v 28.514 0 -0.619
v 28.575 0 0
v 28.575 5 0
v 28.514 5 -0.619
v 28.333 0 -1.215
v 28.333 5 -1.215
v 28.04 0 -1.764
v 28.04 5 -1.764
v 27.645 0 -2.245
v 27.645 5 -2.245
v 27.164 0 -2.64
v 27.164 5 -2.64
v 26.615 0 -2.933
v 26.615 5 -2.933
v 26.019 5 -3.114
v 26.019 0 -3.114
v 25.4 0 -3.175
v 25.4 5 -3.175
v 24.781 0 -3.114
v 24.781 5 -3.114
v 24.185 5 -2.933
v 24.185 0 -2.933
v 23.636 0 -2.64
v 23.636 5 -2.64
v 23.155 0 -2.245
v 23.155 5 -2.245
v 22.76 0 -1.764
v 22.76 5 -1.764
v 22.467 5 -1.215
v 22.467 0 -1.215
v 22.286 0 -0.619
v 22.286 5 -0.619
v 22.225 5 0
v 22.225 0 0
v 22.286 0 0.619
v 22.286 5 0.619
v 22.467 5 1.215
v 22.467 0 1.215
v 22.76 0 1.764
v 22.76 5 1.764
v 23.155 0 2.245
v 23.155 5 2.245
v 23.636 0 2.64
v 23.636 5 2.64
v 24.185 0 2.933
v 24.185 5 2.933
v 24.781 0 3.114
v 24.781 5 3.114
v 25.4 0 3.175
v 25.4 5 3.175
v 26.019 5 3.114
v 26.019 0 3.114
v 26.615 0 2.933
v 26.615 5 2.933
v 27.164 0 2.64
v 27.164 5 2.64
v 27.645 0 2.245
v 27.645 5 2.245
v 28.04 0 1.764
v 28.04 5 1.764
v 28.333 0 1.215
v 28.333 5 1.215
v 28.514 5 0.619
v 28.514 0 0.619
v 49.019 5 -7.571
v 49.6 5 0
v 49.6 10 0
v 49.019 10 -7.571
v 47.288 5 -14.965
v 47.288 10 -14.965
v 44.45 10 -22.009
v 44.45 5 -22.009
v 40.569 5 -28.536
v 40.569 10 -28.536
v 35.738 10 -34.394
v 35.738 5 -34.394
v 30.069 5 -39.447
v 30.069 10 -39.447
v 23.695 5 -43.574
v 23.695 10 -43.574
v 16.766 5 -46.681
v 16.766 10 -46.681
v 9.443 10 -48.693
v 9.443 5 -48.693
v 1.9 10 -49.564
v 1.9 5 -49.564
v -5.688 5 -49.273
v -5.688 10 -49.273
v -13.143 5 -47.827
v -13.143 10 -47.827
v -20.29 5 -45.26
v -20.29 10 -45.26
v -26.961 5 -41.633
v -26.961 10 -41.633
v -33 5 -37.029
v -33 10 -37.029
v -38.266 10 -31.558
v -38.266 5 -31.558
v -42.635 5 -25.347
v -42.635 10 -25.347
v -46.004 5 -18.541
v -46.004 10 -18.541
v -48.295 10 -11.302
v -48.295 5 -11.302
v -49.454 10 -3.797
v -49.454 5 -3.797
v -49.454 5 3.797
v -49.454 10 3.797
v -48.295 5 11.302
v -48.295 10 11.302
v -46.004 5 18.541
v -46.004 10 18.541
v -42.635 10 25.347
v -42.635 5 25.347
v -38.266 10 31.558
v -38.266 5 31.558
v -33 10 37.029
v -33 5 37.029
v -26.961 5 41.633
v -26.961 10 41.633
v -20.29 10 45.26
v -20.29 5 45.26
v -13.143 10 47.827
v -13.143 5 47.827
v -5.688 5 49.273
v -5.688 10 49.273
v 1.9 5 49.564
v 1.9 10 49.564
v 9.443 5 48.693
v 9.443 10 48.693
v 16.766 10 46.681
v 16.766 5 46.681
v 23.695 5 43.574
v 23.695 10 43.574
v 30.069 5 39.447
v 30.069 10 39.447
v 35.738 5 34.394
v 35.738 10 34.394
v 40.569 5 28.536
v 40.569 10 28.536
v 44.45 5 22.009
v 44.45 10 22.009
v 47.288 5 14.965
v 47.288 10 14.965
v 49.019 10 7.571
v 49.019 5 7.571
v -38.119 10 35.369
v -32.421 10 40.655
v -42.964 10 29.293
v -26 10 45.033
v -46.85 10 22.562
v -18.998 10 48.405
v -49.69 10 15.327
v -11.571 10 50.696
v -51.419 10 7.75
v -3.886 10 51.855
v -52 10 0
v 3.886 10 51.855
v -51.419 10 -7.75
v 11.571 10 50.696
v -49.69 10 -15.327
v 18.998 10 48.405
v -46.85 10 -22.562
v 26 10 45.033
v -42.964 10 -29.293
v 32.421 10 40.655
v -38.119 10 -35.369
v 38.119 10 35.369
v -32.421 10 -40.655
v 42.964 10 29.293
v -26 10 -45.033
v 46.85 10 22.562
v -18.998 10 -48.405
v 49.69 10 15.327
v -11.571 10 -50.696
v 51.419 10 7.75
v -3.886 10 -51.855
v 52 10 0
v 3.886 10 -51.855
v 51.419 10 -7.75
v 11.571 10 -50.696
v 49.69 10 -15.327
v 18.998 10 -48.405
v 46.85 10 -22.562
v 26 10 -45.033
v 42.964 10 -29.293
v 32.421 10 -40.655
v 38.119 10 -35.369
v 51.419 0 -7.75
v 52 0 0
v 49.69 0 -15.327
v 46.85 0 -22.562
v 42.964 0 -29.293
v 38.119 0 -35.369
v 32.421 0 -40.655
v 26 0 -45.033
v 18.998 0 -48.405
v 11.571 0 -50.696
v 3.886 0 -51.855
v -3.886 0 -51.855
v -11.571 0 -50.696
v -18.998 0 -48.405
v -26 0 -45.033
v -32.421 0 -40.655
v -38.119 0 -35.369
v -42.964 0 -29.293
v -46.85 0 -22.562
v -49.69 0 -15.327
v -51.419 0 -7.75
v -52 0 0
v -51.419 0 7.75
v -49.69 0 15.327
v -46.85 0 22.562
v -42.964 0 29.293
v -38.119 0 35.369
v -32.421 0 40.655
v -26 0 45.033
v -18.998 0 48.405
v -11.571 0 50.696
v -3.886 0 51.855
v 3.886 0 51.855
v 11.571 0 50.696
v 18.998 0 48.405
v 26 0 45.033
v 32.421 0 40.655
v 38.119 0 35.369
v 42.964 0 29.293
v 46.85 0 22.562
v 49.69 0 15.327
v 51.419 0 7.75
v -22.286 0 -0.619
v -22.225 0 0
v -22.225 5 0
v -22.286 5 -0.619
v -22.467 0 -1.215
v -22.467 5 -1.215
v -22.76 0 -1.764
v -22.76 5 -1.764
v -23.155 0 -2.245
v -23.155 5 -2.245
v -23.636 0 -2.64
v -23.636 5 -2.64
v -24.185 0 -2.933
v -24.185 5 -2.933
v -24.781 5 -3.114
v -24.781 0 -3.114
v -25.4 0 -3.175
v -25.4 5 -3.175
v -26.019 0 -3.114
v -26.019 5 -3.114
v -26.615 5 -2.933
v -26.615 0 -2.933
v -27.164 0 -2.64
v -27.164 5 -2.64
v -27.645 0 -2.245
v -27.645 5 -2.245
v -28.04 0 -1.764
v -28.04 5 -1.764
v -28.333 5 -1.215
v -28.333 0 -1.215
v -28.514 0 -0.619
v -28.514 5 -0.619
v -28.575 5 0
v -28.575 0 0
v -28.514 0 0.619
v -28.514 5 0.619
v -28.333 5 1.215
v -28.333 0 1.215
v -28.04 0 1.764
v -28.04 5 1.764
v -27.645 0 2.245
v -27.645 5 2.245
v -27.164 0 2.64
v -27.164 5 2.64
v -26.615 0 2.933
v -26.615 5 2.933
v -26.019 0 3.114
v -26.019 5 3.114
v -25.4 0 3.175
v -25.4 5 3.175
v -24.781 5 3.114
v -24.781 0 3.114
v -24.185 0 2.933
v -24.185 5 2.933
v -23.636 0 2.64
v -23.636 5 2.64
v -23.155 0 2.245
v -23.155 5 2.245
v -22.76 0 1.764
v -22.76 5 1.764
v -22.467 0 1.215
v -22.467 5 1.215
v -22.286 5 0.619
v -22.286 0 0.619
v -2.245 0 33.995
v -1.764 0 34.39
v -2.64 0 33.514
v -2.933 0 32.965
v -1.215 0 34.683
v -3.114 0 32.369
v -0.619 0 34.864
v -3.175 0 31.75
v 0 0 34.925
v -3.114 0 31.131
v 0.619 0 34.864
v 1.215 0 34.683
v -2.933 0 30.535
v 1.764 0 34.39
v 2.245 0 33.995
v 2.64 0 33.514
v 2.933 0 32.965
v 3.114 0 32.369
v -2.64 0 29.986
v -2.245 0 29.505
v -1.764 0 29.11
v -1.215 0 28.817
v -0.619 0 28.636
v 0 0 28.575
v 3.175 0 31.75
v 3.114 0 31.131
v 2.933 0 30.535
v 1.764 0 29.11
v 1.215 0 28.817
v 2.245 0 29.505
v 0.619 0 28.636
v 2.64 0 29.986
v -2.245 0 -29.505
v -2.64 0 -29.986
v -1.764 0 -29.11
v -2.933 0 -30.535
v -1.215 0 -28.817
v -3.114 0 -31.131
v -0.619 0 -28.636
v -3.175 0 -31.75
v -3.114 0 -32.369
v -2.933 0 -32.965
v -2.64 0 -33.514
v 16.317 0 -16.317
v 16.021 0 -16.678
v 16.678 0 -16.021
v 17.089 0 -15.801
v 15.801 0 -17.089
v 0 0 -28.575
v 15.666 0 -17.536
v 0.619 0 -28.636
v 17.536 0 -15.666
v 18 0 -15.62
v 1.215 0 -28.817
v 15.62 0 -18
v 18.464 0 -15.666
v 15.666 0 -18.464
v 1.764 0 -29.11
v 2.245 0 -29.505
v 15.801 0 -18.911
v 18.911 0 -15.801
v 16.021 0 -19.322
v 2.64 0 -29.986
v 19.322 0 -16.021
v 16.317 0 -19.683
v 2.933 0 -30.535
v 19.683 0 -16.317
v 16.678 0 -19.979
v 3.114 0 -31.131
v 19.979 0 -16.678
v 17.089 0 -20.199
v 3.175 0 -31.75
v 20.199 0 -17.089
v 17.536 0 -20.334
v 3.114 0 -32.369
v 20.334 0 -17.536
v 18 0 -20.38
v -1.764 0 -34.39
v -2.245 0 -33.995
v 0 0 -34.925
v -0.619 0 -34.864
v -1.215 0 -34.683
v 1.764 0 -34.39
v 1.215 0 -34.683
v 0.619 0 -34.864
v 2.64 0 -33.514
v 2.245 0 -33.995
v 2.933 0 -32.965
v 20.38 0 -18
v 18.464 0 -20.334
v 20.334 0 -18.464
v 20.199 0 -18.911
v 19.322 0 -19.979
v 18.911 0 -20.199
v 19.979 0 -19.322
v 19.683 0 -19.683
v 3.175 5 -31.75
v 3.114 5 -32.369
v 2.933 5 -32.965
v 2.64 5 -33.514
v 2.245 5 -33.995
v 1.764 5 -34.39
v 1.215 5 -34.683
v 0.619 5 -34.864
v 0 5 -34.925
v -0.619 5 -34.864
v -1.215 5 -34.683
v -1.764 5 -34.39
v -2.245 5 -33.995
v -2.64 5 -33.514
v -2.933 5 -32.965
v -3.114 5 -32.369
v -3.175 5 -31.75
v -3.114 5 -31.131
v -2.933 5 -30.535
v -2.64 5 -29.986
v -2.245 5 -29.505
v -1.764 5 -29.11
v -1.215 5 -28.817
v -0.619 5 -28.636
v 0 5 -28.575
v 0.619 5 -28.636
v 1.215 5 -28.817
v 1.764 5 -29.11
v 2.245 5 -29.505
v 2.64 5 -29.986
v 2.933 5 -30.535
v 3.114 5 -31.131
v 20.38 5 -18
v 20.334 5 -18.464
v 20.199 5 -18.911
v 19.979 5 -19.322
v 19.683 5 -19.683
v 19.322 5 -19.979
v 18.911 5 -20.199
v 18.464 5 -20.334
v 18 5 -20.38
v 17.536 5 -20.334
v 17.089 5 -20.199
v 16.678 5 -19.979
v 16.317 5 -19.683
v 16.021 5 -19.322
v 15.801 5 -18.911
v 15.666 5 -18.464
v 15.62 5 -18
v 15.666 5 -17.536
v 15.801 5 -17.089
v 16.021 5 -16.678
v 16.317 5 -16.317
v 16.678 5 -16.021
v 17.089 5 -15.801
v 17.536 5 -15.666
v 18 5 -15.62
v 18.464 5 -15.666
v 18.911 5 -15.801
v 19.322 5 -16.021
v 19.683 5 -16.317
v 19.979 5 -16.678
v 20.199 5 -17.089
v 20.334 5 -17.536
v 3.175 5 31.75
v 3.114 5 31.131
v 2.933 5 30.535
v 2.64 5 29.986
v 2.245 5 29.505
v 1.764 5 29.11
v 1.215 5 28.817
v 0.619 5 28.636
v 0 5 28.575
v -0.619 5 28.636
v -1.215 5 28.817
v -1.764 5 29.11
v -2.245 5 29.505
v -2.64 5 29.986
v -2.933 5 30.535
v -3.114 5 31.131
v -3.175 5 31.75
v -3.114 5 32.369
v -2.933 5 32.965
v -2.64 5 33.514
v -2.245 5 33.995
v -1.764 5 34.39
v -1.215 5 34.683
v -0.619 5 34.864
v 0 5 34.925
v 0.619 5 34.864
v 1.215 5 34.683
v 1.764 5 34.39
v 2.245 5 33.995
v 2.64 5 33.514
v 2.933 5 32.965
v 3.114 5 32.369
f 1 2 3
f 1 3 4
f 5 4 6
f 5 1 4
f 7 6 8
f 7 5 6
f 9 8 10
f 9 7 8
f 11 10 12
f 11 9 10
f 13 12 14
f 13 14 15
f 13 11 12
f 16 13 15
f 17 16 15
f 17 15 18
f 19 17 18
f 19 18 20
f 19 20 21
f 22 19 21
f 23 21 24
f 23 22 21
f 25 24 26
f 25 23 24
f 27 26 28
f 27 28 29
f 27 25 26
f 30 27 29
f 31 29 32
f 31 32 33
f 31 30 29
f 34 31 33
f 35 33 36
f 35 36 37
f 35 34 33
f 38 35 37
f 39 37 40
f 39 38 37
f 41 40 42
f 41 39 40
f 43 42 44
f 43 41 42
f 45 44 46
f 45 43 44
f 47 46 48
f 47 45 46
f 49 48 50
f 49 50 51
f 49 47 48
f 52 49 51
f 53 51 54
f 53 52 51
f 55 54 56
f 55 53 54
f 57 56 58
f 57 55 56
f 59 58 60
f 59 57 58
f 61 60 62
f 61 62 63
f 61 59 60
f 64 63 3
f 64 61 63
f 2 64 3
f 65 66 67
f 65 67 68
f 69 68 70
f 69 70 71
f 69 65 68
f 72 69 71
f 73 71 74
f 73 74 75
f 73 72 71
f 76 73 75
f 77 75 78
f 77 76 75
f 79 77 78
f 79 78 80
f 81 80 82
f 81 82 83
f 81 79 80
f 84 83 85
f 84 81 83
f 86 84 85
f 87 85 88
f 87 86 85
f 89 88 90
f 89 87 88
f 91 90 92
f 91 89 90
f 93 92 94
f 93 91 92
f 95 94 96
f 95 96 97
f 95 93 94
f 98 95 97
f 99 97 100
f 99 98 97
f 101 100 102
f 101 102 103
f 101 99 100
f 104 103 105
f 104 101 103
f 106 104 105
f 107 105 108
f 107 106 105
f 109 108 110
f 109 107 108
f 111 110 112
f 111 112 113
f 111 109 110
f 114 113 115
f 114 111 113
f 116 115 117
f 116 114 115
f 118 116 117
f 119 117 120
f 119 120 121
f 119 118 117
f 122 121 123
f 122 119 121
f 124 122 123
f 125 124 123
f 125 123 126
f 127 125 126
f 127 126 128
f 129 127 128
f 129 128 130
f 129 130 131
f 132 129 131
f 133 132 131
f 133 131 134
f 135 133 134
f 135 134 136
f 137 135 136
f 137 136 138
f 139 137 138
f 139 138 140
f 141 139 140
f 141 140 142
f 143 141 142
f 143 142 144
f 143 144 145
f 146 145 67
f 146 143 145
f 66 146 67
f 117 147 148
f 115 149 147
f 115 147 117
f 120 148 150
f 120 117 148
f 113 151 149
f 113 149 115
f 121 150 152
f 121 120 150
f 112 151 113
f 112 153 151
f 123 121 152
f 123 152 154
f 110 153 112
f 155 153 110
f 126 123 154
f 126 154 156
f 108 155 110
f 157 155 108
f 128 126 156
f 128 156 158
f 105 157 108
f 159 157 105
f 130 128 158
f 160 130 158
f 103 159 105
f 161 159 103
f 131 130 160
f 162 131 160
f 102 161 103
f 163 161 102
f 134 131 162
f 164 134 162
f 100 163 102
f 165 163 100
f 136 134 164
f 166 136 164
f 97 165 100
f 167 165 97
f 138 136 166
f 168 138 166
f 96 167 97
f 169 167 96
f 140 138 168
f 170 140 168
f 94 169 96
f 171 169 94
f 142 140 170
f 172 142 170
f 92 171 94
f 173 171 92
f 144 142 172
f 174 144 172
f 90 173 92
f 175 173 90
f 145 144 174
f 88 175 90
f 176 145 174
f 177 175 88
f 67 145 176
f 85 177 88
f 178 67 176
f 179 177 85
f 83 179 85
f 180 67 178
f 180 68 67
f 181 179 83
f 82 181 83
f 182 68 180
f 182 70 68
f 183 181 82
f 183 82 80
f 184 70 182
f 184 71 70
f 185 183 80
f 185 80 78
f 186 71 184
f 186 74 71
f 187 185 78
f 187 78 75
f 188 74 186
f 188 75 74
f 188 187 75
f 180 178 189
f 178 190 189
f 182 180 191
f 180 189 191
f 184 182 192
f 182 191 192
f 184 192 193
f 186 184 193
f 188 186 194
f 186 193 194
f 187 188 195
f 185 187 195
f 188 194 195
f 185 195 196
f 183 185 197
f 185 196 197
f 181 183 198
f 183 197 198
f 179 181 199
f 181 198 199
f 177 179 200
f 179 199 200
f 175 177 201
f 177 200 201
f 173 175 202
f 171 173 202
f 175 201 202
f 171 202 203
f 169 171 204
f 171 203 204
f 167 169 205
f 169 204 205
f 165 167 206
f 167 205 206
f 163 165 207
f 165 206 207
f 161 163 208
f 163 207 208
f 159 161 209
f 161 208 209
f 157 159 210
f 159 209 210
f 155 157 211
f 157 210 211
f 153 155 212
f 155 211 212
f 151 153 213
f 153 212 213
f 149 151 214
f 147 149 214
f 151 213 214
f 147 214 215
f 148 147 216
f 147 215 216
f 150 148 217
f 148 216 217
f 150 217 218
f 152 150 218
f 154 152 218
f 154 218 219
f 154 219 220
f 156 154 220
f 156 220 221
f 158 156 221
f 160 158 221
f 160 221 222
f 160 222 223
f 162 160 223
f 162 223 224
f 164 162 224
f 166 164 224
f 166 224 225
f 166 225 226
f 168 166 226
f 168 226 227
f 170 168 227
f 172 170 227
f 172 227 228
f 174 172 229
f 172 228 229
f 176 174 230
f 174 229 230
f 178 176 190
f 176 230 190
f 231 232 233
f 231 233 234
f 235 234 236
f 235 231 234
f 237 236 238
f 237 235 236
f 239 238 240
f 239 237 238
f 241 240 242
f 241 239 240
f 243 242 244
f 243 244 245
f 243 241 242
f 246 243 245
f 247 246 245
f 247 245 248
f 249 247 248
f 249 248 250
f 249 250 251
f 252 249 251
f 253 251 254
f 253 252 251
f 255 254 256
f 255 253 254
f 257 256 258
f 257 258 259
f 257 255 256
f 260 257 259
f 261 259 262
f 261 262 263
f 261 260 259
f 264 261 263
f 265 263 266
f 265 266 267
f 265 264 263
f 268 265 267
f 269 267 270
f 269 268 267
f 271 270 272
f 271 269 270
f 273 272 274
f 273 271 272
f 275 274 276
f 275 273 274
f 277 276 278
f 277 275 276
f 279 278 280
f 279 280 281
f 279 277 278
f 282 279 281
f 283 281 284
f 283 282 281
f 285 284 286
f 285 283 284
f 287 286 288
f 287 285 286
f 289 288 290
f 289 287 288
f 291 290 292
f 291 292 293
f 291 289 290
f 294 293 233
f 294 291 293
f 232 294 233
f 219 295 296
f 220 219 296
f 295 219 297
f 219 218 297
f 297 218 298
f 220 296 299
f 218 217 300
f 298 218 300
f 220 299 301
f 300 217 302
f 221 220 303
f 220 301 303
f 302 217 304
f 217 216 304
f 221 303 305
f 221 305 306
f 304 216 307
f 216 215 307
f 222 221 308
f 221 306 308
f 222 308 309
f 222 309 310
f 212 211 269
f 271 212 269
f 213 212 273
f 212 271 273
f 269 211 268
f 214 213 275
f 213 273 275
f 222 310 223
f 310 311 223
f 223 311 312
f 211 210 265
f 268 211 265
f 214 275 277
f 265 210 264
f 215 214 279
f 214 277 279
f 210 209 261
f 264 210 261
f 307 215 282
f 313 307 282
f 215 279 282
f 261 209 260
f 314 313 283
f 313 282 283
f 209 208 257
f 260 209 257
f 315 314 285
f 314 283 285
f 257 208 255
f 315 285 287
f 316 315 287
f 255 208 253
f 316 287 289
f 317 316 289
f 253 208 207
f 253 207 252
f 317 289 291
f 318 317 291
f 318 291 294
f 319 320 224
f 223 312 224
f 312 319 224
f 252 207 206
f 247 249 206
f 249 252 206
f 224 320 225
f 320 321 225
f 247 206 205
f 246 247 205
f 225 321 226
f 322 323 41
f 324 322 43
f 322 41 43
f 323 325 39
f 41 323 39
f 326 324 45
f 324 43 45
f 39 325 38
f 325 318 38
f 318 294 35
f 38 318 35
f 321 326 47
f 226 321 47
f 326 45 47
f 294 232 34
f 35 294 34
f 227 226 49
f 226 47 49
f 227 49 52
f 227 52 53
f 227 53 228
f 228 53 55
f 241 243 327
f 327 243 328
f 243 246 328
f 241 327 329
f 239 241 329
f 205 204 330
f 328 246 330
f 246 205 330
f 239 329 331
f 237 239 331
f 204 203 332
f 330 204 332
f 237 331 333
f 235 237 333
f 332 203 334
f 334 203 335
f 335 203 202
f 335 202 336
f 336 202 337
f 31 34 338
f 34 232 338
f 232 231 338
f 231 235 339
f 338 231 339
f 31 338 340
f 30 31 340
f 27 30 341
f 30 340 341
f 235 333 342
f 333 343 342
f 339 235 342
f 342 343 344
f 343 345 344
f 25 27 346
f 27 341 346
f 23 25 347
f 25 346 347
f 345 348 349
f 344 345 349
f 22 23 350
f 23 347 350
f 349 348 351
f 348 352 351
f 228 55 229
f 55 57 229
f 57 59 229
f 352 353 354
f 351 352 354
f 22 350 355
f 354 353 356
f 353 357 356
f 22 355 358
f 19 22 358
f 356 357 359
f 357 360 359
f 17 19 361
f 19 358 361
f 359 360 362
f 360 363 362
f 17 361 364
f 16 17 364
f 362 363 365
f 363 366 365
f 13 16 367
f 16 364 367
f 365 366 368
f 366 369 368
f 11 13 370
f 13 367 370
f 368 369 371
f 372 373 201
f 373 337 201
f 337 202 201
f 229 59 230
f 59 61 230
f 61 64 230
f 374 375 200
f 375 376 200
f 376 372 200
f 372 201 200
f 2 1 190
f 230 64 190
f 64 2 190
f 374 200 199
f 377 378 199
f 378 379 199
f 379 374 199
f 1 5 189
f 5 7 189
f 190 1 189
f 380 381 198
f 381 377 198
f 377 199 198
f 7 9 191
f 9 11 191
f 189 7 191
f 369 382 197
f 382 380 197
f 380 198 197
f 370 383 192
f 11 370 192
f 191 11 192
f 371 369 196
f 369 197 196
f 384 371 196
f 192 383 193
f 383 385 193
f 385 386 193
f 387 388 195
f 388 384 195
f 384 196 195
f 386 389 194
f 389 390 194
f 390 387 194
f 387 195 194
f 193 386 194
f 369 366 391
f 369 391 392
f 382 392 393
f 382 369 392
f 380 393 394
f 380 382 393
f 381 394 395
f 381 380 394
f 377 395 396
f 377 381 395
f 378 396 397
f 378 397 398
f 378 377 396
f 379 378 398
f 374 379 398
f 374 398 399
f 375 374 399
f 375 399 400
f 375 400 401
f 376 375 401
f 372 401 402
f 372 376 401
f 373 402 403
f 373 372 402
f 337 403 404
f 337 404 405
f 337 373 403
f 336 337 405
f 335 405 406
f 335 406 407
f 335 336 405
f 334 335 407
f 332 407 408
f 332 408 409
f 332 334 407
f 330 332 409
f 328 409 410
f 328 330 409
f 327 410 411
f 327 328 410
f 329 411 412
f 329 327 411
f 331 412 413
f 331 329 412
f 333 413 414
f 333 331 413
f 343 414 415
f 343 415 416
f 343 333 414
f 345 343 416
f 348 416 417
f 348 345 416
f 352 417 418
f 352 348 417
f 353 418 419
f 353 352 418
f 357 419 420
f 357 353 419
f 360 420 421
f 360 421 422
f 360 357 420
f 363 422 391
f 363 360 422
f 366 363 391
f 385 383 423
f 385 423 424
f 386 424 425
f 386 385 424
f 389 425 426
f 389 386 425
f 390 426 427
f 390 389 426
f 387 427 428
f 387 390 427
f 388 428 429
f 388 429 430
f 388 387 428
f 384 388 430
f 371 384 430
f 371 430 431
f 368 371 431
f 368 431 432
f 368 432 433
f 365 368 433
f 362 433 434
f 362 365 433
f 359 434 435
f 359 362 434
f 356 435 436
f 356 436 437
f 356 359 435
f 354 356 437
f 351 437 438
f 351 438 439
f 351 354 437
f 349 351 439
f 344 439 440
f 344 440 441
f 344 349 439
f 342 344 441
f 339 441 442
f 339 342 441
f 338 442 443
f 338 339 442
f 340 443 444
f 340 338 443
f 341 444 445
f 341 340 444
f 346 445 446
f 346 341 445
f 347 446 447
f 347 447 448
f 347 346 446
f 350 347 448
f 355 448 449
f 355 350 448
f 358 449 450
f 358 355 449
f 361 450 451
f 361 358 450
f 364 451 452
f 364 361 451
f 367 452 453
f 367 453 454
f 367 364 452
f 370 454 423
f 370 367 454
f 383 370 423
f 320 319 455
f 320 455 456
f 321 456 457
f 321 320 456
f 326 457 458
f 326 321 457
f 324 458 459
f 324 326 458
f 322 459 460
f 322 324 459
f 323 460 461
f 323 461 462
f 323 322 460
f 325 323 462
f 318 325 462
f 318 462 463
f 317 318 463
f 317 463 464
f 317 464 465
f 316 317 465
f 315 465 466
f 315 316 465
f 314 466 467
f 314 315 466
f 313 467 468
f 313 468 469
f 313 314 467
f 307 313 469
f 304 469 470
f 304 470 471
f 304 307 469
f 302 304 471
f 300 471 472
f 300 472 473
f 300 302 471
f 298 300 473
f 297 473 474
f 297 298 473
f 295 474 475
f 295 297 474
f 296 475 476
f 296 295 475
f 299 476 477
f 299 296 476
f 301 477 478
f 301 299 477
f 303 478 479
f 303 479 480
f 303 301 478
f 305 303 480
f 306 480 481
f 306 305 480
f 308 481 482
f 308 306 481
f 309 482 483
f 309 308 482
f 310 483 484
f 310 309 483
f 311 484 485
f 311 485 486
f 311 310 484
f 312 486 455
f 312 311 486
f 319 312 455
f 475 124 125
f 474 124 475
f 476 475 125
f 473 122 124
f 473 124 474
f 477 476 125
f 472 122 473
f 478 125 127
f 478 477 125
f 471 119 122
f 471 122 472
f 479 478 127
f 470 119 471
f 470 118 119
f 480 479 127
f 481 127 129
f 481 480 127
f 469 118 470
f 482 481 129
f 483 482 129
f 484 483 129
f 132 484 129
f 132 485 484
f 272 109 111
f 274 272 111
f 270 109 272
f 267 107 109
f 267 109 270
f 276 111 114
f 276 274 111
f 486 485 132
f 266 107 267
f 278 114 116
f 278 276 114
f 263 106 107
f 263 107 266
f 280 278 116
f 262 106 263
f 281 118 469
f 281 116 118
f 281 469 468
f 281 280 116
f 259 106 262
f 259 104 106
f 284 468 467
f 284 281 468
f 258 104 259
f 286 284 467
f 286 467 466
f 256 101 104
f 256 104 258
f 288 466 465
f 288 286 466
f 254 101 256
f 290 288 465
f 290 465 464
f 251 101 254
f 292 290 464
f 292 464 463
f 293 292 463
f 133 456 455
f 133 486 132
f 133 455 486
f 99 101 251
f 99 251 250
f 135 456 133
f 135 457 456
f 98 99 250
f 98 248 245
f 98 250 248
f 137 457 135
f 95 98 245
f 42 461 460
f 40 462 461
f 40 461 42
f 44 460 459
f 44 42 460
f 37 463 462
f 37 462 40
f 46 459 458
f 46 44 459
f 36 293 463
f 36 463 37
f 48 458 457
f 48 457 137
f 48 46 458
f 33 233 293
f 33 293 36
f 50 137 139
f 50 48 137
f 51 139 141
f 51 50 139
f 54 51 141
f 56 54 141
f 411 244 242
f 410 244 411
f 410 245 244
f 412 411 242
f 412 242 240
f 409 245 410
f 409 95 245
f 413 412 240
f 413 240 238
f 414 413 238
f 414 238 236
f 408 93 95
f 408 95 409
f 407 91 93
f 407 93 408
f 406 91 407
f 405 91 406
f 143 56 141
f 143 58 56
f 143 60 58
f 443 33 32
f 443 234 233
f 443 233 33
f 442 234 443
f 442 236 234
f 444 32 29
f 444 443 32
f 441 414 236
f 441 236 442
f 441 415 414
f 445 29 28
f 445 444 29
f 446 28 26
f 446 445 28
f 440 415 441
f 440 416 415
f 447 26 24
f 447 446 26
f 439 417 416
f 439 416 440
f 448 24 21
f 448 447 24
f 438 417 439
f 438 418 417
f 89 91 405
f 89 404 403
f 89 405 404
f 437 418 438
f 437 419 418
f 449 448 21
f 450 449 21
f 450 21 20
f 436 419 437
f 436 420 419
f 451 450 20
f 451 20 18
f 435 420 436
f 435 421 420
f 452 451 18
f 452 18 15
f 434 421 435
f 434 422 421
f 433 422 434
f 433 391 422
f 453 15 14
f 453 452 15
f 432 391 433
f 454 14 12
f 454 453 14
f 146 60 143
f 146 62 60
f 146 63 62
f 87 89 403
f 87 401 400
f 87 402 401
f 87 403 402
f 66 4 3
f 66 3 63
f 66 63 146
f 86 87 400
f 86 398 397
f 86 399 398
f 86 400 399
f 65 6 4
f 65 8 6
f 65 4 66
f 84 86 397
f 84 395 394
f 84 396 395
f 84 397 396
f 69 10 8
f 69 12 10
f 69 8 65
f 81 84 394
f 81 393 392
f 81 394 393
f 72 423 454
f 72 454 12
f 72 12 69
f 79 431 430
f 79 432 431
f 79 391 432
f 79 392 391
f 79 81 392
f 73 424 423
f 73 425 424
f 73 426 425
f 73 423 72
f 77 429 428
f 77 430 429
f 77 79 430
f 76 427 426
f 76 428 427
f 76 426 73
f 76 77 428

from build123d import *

# Parameters (mm, degrees)
SKETCH1_R           = 52
SKETCH1_R_2         = 3.175
SKETCH1_R_3         = 2.38
BOSS_EXTRUDE1_DEPTH = 5
SKETCH2_R           = 52
SKETCH2_R_2         = 49.6
BOSS_EXTRUDE2_DEPTH = 5


with BuildPart() as part:
    # Sketch1 → Boss-Extrude1 (new body)
    with BuildSketch(Plane(origin=(0, 0, 0), x_dir=(1, 0, 0), z_dir=(0, 1, 0))):
        Circle(SKETCH1_R)
        with Locations((25.4, 0)):
            Circle(SKETCH1_R_2, mode=Mode.SUBTRACT)
        with Locations((0, 31.75)):
            Circle(SKETCH1_R_2, mode=Mode.SUBTRACT)
        with Locations((-25.4, 0)):
            Circle(SKETCH1_R_2, mode=Mode.SUBTRACT)
        with Locations((0, -31.75)):
            Circle(SKETCH1_R_2, mode=Mode.SUBTRACT)
        with Locations((18, 18)):
            Circle(SKETCH1_R_3, mode=Mode.SUBTRACT)
    extrude(amount=BOSS_EXTRUDE1_DEPTH)

    # Sketch2 → Boss-Extrude2 (add)
    with BuildSketch(Plane(origin=(0, 5, 0), x_dir=(1, 0, 0), z_dir=(0, 1, 0))):
        Circle(SKETCH2_R)
        Circle(SKETCH2_R_2, mode=Mode.SUBTRACT)
    extrude(amount=BOSS_EXTRUDE2_DEPTH)


solid = part.part
